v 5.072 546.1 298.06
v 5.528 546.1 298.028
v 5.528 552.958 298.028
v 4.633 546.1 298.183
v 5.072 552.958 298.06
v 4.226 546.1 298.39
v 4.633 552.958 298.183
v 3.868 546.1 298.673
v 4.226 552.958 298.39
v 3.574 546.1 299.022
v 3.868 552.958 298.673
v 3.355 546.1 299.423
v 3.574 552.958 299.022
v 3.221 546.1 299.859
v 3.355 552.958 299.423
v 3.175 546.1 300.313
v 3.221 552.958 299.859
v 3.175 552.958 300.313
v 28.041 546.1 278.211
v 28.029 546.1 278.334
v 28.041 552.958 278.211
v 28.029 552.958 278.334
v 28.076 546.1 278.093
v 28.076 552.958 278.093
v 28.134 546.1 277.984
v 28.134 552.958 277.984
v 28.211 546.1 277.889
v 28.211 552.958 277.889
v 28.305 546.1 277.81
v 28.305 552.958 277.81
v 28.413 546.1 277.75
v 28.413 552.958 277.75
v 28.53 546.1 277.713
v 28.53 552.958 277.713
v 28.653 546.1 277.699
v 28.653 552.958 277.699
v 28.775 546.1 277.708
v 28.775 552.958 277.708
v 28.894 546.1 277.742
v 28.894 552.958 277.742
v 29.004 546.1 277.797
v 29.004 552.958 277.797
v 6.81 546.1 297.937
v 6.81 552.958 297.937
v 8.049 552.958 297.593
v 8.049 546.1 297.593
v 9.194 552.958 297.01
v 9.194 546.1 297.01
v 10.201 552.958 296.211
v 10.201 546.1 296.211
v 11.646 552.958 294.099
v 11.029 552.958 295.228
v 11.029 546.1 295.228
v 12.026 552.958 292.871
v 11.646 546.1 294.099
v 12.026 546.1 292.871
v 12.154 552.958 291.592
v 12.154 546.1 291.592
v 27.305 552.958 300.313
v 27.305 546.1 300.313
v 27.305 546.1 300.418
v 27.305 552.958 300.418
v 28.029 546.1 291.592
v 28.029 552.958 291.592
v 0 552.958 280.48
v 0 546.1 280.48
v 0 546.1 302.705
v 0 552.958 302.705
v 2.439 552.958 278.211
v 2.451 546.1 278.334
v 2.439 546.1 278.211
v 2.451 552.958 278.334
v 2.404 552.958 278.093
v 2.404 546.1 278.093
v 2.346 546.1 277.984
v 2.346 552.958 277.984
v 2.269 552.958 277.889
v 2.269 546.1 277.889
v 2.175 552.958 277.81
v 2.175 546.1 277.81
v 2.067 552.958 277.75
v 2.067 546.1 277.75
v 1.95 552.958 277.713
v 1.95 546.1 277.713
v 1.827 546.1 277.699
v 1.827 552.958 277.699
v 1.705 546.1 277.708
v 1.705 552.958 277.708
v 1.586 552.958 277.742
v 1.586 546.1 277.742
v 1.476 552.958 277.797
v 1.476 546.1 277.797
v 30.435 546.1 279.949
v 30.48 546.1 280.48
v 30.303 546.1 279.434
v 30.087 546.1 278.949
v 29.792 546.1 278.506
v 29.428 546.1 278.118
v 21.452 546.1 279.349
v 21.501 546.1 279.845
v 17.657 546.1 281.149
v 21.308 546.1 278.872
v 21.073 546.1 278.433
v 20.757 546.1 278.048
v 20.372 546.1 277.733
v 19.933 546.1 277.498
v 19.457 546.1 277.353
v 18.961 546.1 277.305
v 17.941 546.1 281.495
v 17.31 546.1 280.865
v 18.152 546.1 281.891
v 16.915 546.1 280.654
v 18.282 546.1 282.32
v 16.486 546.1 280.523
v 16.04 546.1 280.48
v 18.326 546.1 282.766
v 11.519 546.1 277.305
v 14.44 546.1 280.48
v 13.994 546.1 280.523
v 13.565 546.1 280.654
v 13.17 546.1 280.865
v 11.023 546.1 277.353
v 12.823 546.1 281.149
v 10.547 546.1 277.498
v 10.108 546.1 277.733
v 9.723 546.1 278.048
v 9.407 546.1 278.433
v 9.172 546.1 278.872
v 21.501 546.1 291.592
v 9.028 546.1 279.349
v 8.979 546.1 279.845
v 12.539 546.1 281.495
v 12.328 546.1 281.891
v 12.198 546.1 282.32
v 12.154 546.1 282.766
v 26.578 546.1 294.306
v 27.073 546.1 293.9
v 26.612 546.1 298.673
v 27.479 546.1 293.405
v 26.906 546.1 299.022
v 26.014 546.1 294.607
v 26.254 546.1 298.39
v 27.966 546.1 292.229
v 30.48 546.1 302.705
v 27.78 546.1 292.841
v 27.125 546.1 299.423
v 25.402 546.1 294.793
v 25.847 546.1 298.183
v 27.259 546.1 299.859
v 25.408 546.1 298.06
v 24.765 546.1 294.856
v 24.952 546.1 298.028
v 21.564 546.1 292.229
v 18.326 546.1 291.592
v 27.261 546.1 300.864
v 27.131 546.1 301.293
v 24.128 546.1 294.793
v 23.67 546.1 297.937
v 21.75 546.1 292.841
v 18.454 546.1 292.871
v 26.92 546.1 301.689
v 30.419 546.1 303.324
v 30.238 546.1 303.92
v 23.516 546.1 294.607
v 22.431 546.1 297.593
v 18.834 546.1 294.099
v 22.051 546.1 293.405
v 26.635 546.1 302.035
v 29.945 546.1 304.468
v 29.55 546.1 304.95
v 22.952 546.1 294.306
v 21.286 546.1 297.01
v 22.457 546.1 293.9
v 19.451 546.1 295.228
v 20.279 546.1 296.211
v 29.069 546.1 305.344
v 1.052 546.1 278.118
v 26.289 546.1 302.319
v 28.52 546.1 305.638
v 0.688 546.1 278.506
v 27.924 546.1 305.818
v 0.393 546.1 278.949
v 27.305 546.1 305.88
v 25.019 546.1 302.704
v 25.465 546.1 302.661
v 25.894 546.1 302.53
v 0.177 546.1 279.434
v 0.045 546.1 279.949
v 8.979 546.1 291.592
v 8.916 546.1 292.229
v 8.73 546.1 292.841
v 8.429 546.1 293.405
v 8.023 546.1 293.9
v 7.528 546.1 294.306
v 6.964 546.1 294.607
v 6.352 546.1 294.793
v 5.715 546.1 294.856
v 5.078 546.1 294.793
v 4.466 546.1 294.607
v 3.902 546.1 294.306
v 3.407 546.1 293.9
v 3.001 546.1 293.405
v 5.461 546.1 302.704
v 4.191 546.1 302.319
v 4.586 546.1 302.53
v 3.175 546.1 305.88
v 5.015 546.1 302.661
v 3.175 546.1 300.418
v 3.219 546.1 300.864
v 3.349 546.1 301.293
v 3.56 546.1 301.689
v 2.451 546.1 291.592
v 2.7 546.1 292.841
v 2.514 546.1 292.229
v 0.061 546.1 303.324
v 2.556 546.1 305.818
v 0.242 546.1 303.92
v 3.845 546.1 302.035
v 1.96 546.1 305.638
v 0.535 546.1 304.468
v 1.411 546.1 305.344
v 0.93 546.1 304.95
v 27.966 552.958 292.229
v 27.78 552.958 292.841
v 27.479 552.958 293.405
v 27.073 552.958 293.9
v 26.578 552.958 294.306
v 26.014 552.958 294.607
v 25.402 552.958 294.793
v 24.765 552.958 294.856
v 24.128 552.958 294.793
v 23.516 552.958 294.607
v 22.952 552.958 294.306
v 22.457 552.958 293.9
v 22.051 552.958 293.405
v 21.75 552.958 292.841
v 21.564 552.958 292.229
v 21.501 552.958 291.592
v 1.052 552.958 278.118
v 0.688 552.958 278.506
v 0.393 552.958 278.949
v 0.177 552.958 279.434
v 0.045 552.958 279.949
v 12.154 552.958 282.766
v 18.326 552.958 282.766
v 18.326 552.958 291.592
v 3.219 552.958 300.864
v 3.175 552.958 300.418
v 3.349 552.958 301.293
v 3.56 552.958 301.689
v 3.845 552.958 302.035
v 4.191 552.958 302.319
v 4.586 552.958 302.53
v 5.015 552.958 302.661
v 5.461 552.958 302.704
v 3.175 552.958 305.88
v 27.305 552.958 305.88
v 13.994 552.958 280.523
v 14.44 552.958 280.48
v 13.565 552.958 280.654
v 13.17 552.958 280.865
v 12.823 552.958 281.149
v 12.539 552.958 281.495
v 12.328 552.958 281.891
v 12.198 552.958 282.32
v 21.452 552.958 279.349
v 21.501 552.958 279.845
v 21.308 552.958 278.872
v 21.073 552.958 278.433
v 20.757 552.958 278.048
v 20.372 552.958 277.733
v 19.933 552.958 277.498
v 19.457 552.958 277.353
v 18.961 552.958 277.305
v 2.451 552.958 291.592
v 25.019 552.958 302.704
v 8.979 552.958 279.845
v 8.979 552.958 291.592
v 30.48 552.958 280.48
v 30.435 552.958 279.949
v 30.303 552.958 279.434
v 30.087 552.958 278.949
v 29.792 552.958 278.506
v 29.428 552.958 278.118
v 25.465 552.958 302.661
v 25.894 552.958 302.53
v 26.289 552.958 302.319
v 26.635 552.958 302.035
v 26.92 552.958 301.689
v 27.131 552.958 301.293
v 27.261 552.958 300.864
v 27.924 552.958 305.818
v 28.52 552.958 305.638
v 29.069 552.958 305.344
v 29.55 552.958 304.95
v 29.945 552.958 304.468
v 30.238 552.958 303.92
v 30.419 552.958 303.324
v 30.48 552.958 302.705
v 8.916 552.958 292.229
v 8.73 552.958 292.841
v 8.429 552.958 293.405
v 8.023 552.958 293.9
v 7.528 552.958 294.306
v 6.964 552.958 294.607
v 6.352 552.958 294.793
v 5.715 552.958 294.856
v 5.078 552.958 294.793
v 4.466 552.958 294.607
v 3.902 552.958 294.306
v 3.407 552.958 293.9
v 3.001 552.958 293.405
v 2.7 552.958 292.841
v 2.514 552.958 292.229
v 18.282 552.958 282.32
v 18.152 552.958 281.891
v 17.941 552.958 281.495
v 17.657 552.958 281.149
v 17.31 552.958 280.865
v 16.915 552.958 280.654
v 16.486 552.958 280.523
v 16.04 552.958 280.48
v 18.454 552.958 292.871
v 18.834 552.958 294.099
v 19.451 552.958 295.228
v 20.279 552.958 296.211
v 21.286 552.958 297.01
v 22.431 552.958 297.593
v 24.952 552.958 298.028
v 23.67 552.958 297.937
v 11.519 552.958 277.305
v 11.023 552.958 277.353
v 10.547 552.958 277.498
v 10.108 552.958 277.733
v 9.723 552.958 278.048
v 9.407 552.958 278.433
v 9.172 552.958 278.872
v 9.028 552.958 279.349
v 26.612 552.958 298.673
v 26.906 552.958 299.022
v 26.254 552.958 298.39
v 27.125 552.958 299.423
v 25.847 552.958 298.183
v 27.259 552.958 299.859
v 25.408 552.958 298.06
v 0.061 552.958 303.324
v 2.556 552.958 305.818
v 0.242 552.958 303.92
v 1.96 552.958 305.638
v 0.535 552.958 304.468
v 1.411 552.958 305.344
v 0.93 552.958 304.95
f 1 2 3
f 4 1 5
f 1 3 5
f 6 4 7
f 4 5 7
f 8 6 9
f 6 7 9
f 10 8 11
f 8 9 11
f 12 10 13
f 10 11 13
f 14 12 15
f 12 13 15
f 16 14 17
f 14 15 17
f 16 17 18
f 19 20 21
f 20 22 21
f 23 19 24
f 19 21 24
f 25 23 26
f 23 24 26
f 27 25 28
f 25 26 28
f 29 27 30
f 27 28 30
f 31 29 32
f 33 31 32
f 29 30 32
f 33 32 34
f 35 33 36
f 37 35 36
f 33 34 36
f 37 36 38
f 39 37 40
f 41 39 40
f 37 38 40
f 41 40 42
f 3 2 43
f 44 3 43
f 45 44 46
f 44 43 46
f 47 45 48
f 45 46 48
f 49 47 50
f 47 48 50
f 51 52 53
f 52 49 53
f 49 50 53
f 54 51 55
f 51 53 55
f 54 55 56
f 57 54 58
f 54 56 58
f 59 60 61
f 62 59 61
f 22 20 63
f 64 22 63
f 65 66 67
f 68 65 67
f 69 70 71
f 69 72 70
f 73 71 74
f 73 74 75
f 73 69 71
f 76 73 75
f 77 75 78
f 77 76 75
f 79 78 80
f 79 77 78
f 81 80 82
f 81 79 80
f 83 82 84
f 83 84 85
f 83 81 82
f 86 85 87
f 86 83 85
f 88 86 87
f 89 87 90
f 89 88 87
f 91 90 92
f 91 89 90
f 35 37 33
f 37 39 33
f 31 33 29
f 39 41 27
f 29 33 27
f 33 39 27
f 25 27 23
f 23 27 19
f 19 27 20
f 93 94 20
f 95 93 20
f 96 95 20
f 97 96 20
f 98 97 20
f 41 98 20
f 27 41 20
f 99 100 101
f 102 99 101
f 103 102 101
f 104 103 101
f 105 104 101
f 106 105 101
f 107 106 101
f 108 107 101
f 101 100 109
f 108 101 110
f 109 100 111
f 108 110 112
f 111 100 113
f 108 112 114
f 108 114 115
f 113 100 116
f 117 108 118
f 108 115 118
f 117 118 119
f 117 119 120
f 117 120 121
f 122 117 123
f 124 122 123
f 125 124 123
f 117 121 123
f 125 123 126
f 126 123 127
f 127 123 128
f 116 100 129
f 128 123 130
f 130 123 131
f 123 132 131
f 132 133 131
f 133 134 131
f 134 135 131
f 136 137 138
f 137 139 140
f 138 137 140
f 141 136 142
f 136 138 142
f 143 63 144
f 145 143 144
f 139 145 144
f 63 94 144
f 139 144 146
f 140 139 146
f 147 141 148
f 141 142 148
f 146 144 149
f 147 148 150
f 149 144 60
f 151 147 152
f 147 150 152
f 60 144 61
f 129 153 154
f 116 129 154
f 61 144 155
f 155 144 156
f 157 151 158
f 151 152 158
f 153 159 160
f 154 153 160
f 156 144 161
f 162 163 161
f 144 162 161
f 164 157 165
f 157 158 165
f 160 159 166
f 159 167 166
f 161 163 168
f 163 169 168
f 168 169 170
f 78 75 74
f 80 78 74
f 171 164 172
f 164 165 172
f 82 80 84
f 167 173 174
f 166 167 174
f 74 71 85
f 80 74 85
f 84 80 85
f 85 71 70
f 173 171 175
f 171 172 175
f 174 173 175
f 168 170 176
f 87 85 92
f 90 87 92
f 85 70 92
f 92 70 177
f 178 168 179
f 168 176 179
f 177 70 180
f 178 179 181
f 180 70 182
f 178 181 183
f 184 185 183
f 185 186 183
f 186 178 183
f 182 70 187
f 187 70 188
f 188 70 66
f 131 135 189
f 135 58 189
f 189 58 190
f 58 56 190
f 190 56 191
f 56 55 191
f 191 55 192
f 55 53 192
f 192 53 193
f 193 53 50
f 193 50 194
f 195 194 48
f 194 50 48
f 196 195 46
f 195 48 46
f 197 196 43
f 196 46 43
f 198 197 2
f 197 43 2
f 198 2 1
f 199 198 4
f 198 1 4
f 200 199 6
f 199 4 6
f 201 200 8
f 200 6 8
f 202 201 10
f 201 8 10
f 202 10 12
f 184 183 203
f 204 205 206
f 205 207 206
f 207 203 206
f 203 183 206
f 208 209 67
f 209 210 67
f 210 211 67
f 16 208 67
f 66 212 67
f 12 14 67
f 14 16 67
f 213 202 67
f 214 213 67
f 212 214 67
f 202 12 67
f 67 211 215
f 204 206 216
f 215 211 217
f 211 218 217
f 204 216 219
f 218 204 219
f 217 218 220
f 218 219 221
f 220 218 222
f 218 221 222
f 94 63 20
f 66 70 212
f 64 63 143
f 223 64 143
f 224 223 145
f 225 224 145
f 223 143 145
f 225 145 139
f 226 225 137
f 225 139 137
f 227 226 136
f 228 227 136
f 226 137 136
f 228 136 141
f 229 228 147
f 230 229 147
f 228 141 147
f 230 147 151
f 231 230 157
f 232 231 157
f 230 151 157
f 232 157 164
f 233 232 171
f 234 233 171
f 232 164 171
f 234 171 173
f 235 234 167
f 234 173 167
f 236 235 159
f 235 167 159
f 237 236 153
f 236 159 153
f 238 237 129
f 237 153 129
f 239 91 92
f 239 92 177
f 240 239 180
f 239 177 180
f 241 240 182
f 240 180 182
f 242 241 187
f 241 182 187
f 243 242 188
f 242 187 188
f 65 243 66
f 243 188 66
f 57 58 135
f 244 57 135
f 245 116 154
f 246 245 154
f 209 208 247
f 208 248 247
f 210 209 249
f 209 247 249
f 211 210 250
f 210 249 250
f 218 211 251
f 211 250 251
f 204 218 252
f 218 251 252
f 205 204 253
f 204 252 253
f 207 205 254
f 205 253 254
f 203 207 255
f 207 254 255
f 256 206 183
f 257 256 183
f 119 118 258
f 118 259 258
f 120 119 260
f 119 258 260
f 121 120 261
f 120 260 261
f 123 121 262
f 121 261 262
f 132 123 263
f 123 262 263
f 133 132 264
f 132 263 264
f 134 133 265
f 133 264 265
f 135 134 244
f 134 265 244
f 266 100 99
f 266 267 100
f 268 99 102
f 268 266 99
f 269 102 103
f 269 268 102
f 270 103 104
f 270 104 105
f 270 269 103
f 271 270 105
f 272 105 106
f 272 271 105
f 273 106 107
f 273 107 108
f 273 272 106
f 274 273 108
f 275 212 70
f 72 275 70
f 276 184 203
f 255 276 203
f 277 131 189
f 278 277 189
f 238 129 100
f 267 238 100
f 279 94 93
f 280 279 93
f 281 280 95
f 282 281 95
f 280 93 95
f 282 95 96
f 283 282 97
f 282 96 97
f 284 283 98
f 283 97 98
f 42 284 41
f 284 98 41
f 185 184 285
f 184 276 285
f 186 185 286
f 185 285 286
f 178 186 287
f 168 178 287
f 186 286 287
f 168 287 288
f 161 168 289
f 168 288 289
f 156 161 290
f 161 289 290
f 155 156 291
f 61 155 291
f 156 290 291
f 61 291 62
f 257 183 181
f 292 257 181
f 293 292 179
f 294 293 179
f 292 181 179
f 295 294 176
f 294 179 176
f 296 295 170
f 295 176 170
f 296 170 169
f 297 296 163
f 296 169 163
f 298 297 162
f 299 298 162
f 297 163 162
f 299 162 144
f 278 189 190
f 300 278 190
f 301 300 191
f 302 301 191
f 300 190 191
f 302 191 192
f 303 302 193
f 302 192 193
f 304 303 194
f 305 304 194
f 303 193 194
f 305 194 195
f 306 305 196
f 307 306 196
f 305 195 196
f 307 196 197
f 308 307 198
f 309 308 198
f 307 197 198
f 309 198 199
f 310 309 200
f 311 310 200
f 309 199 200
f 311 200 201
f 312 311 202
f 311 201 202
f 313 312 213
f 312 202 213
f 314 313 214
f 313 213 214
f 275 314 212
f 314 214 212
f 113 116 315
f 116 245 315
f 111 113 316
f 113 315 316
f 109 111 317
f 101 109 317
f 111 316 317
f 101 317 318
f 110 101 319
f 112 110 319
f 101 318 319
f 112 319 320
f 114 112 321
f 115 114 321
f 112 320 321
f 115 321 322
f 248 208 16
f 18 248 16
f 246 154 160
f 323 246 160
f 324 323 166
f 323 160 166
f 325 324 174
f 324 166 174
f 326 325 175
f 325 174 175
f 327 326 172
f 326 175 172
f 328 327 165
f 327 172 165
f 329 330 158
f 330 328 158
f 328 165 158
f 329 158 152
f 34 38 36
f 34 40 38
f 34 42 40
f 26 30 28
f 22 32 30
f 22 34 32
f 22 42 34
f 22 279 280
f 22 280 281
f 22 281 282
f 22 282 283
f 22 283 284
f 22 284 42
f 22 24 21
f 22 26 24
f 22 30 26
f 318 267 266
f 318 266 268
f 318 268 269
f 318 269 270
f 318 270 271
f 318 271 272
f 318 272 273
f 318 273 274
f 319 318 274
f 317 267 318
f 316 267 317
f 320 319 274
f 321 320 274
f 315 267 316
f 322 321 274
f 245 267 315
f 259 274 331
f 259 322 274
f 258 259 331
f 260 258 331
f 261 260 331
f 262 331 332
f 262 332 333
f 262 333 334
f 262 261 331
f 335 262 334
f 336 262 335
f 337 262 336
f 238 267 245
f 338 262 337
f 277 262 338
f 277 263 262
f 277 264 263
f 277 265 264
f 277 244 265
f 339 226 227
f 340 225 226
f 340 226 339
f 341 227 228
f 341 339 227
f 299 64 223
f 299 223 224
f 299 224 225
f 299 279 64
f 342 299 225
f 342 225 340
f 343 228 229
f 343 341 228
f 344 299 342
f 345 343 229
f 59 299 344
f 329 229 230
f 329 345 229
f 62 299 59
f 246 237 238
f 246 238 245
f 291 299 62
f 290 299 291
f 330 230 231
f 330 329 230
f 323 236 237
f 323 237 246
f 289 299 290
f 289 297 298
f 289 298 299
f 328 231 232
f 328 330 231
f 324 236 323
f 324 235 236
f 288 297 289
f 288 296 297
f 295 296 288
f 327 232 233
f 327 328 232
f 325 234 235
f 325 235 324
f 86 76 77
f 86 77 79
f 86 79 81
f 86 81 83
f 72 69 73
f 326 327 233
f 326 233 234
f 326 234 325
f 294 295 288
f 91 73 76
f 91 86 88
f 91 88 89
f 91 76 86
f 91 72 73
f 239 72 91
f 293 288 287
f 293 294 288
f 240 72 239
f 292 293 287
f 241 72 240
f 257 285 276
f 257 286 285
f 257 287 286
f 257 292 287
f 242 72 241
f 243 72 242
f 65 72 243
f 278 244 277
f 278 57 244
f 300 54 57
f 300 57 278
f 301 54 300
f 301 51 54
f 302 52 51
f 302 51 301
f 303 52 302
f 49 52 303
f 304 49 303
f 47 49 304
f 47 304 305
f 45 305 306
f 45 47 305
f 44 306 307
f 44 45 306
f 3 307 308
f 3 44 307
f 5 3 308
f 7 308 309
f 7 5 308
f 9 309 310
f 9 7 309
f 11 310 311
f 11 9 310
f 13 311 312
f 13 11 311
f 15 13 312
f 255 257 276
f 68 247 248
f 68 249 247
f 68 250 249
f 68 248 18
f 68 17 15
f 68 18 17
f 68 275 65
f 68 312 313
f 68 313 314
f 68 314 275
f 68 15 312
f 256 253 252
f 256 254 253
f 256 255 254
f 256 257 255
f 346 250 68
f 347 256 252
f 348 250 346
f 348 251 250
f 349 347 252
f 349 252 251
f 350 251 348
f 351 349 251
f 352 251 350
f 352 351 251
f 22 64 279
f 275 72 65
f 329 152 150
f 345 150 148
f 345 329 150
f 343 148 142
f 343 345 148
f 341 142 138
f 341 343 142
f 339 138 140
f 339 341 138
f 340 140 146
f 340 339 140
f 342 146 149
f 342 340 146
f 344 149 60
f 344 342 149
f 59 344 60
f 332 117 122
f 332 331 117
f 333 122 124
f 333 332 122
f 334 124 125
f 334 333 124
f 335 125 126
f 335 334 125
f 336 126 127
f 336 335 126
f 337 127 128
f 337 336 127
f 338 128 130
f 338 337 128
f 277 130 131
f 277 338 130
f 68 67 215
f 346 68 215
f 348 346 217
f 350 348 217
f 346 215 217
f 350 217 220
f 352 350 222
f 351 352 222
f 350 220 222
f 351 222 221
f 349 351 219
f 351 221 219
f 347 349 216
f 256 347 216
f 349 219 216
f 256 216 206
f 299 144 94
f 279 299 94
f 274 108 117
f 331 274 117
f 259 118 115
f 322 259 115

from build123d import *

# Parameters (mm, degrees)
BOSS_EXTRUDE1_DEPTH     = 6.858
FILLET1_R               = 2.54
FILLET2_R               = 0.635
CUT_EXTRUDE1_DEPTH      = 308.470862171
CUT_EXTRUDE1_DEPTH_BACK = 308.470862171
FILLET3_R               = 2.286


with BuildPart() as part:
    # Sketch1 → Boss-Extrude1 (new body)
    with BuildSketch(Plane(origin=(0, 546.1, 533.938575125), x_dir=(1, 0, 0), z_dir=(0, -1, 0))):
        with BuildLine():
            Line((21.5011, -242.346575125), (21.5011, -256.634075125))
            Line((21.5011, -256.634075125), (8.9789, -256.634075125))
            Line((8.9789, -256.634075125), (8.9789, -242.346575125))
            ThreePointArc((8.9789, -242.346575125), (5.715, -239.082675125), (2.4511, -242.346575125))
            Line((2.4511, -242.346575125), (2.4511, -256.550449219))
            ThreePointArc((2.4511, -256.550449219), (0.687128671, -255.431667645), (0, -253.459075125))
            Line((0, -253.459075125), (0, -231.234075125))
            ThreePointArc((0, -231.234075125), (0.92993597, -228.989011095), (3.175, -228.059075125))
            Line((3.175, -228.059075125), (27.305, -228.059075125))
            ThreePointArc((27.305, -228.059075125), (29.55006403, -228.989011095), (30.48, -231.234075125))
            Line((30.48, -231.234075125), (30.48, -253.459075125))
            ThreePointArc((30.48, -253.459075125), (29.792871329, -255.431667645), (28.0289, -256.550449219))
            Line((28.0289, -256.550449219), (28.0289, -242.346575125))
            ThreePointArc((28.0289, -242.346575125), (24.765, -239.082675125), (21.5011, -242.346575125))
        make_face()
    extrude(amount=-BOSS_EXTRUDE1_DEPTH)

    # Fillet1
    fillet1_edges = [part.edges().sort_by_distance(p)[0] for p in [
        (21.5011, 549.529, 277.3045),
        (8.9789, 549.529, 277.3045),
    ]]
    fillet(fillet1_edges, radius=FILLET1_R)

    # Fillet2
    fillet2_edges = [part.edges().sort_by_distance(p)[0] for p in [
        (28.0289, 549.529, 277.388125906),
        (2.4511, 549.529, 277.388125906),
    ]]
    fillet(fillet2_edges, radius=FILLET2_R)

    # Sketch2 → Cut-Extrude1 (cut, two sides)
    with BuildSketch(Plane.XZ.offset(-546.1)) as cut_extrude1_sk:
        with BuildLine():
            Line((27.305, 297.508741773), (27.305, 302.7045))
            Line((27.305, 302.7045), (3.175, 302.7045))
            Line((3.175, 302.7045), (3.175, 297.508741773))
            ThreePointArc((3.175, 297.508741773), (9.257924442, 296.968534163), (12.1539, 291.592))
            Line((12.1539, 291.592), (12.1539, 280.4795))
            Line((12.1539, 280.4795), (18.3261, 280.4795))
            Line((18.3261, 280.4795), (18.3261, 291.592))
            ThreePointArc((18.3261, 291.592), (21.222075558, 296.968534163), (27.305, 297.508741773))
        make_face()
    extrude(amount=CUT_EXTRUDE1_DEPTH, mode=Mode.SUBTRACT)
    extrude(cut_extrude1_sk.sketch, amount=-CUT_EXTRUDE1_DEPTH_BACK, mode=Mode.SUBTRACT)

    # Fillet3
    fillet3_edges = [part.edges().sort_by_distance(p)[0] for p in [
        (27.305, 549.529, 297.508741773),
        (18.3261, 549.529, 280.4795),
        (12.1539, 549.529, 280.4795),
        (3.175, 549.529, 297.508741773),
        (3.175, 549.529, 302.7045),
        (27.305, 549.529, 302.7045),
    ]]
    fillet(fillet3_edges, radius=FILLET3_R)


solid = part.part
